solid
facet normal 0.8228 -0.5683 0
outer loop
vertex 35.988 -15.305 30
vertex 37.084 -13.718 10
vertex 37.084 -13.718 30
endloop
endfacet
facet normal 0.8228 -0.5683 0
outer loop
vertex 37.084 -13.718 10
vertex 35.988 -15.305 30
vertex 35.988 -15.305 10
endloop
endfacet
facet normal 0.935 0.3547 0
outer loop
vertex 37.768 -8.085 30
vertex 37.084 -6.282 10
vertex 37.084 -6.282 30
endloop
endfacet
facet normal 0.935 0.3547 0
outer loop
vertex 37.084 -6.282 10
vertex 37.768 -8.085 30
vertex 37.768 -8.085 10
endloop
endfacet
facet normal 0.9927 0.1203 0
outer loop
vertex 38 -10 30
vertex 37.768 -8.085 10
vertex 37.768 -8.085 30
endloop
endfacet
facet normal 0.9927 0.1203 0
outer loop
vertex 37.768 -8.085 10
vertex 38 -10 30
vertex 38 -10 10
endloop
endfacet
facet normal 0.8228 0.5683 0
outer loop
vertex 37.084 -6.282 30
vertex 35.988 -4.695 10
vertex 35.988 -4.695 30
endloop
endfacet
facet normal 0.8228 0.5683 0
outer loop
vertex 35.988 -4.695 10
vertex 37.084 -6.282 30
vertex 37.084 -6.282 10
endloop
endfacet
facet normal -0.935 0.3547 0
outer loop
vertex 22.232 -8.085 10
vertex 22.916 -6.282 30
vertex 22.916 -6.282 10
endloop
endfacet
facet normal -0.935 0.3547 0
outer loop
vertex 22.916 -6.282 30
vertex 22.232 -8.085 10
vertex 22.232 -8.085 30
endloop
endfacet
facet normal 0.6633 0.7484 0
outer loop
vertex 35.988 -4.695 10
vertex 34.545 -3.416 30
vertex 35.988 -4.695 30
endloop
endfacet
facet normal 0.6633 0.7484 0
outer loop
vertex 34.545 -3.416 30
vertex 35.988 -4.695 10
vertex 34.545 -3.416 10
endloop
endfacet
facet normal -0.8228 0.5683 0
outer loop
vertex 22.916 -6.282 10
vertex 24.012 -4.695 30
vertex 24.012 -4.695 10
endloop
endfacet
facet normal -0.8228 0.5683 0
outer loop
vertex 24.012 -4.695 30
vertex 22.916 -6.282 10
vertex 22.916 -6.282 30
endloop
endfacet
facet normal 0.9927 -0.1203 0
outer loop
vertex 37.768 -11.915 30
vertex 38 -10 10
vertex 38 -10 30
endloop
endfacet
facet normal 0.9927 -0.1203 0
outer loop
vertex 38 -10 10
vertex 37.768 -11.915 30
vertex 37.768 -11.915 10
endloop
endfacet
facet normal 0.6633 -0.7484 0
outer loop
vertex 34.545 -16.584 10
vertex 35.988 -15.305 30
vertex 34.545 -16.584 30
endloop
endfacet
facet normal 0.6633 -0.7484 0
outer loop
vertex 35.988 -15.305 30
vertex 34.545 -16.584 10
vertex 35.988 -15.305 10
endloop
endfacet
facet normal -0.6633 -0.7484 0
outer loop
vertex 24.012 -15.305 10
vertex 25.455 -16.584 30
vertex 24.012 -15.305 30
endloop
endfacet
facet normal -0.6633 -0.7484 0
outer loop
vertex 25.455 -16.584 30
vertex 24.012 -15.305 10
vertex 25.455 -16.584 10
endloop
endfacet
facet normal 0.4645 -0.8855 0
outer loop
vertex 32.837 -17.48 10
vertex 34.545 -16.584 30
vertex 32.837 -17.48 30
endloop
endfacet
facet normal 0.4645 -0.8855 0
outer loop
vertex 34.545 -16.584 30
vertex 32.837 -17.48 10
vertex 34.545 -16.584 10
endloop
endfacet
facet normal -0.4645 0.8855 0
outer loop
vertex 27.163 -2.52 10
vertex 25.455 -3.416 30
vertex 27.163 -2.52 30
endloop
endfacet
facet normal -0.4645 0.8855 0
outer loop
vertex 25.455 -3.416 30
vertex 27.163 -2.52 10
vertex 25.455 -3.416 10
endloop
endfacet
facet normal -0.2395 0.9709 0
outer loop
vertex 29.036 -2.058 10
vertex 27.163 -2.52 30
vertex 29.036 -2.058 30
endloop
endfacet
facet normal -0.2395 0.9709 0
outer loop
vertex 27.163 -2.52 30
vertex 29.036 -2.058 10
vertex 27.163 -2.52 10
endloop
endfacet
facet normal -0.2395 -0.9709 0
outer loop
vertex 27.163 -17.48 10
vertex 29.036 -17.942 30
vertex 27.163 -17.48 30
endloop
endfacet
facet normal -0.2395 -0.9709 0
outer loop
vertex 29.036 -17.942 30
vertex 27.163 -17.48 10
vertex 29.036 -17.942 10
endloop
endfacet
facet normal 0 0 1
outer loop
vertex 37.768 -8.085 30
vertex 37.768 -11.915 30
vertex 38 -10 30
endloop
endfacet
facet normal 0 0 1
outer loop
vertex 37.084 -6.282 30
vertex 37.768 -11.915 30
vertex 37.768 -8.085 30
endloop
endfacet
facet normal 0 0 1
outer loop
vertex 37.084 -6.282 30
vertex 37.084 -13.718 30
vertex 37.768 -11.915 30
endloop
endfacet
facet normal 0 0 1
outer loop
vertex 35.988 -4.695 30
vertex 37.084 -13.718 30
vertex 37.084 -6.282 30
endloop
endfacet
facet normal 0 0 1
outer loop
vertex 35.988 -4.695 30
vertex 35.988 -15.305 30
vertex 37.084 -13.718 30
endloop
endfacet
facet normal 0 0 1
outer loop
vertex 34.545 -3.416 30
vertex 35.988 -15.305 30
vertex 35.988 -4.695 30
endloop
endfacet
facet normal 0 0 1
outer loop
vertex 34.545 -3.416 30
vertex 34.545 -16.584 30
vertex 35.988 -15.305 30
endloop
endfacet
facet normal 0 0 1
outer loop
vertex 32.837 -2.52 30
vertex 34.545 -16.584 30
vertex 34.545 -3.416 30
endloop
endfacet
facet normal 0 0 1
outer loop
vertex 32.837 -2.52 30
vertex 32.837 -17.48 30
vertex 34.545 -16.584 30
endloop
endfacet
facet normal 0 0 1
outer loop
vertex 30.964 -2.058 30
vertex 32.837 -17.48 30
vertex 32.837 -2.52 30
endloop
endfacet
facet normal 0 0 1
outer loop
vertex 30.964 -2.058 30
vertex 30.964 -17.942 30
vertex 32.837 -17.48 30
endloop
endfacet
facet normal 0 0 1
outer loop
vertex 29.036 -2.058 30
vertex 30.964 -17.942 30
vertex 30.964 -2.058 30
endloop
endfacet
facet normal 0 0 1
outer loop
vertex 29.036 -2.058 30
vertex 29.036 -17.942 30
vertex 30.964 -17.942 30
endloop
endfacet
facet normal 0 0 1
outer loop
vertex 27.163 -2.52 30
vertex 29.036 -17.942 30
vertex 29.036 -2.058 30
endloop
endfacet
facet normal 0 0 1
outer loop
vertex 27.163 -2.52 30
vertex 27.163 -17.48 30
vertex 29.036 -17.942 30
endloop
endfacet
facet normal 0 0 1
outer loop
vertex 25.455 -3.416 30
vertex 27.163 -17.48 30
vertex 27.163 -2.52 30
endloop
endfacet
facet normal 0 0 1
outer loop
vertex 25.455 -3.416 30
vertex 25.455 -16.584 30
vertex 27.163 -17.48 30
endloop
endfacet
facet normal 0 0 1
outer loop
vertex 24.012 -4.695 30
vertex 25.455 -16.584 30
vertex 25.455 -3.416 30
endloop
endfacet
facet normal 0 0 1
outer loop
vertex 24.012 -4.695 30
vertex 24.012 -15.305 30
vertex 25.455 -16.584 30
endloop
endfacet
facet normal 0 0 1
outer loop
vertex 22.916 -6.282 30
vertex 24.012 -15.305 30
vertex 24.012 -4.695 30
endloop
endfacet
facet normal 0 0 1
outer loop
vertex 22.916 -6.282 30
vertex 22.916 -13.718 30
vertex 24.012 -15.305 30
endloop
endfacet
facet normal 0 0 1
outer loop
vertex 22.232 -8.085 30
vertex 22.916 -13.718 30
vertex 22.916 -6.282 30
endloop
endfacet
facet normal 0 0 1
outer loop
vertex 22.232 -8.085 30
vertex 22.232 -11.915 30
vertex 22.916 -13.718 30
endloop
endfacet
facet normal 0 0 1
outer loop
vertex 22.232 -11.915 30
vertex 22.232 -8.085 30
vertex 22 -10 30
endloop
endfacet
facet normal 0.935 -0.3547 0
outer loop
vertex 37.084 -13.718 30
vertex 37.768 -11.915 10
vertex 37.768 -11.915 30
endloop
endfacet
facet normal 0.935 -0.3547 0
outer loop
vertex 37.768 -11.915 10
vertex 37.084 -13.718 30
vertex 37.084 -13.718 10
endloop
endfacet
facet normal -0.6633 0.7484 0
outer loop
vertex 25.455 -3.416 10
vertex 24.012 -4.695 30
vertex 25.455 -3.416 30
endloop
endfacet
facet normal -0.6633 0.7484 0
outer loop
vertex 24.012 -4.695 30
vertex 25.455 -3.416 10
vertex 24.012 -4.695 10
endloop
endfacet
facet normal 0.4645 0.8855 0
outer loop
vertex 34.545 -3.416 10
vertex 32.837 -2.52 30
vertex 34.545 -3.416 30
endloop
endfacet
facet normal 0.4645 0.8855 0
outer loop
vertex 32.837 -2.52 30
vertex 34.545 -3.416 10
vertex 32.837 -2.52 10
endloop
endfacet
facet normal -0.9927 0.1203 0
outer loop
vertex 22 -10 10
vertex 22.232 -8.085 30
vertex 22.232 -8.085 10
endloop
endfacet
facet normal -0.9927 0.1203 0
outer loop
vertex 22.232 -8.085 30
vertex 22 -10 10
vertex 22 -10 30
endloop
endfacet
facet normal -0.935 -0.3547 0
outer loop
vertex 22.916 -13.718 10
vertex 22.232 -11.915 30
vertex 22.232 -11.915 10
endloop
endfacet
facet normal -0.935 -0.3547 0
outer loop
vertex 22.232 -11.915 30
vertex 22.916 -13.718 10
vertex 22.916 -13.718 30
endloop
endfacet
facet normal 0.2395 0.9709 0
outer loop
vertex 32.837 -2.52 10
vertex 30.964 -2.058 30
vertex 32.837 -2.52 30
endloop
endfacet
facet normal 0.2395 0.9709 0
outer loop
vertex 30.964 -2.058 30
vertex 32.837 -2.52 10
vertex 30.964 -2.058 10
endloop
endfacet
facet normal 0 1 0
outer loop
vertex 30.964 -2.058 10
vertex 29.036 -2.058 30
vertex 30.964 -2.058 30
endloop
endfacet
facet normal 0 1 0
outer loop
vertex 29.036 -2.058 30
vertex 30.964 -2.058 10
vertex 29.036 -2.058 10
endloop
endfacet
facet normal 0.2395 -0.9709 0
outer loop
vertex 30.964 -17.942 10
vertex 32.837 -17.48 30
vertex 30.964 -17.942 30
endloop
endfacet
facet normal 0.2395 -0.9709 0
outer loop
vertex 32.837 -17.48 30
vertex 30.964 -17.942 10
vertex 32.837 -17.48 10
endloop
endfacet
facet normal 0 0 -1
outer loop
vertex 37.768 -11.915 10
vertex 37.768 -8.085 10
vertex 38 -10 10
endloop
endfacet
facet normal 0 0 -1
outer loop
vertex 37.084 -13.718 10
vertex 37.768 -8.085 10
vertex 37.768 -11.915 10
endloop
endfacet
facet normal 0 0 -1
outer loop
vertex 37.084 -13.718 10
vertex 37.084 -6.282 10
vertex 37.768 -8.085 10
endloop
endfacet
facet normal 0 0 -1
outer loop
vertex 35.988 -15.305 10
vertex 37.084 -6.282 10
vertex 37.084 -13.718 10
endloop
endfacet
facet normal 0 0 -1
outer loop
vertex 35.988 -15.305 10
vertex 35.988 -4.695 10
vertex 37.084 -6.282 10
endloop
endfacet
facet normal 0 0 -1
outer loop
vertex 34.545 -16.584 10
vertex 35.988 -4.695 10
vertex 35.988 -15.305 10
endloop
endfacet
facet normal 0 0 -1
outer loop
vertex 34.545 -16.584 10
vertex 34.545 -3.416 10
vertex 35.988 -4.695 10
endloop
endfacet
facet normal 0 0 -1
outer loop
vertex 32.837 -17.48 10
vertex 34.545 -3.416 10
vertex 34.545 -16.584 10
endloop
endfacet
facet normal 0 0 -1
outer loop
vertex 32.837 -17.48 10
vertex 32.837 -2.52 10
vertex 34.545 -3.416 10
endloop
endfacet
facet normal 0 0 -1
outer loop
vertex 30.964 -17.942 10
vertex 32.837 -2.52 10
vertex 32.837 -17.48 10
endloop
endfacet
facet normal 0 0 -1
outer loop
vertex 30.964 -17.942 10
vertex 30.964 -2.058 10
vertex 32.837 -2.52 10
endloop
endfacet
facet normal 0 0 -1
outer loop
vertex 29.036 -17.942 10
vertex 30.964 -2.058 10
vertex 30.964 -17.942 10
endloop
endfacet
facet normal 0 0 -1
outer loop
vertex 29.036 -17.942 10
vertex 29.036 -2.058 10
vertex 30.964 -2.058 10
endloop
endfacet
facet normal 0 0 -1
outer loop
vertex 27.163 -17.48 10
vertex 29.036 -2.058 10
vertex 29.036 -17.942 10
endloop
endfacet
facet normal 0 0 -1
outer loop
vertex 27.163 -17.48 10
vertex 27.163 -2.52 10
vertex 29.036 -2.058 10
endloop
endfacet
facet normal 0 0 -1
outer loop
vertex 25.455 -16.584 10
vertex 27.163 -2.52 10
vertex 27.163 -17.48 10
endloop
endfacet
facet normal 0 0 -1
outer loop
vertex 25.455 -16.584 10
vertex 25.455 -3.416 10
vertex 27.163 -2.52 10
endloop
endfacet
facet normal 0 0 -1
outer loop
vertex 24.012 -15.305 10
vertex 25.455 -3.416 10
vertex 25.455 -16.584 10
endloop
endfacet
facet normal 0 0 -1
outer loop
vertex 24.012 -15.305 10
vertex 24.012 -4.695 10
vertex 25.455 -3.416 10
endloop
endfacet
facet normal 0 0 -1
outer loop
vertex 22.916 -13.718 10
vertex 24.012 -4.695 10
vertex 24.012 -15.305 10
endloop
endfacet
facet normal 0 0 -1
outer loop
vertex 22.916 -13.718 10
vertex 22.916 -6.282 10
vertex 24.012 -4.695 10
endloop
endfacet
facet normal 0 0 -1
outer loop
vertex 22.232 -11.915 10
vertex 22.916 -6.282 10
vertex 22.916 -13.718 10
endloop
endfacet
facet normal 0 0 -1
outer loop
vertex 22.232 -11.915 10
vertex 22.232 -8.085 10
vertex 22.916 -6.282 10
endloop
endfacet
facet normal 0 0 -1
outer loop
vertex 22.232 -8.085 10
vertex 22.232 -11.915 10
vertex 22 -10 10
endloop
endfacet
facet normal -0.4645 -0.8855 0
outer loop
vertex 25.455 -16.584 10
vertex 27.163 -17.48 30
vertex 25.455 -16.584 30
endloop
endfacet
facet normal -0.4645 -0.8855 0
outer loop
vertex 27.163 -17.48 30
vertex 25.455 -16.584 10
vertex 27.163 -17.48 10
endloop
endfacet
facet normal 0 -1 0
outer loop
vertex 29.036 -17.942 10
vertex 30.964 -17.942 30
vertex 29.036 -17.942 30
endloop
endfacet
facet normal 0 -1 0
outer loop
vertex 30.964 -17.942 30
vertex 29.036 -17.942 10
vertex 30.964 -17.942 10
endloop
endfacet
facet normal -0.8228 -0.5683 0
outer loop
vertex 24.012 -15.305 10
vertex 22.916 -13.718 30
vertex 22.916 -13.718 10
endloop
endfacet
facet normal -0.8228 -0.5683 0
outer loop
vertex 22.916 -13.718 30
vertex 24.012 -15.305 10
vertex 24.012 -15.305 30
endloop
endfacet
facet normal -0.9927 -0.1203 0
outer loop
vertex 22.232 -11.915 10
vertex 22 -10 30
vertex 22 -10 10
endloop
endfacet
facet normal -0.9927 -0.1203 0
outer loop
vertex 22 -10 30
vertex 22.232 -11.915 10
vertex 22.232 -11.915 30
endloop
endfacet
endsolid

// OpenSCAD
// Generated by generate_scads.py
difference() {
  translate([30,-10,20]) {
    cylinder(h=20, r=8, center=true);
  }
  scale([1.5,1.0,2.0]) {
    cube(size=[20,5,10], center=false);
  }
  cylinder(h=10, r=2, center=false);
}
